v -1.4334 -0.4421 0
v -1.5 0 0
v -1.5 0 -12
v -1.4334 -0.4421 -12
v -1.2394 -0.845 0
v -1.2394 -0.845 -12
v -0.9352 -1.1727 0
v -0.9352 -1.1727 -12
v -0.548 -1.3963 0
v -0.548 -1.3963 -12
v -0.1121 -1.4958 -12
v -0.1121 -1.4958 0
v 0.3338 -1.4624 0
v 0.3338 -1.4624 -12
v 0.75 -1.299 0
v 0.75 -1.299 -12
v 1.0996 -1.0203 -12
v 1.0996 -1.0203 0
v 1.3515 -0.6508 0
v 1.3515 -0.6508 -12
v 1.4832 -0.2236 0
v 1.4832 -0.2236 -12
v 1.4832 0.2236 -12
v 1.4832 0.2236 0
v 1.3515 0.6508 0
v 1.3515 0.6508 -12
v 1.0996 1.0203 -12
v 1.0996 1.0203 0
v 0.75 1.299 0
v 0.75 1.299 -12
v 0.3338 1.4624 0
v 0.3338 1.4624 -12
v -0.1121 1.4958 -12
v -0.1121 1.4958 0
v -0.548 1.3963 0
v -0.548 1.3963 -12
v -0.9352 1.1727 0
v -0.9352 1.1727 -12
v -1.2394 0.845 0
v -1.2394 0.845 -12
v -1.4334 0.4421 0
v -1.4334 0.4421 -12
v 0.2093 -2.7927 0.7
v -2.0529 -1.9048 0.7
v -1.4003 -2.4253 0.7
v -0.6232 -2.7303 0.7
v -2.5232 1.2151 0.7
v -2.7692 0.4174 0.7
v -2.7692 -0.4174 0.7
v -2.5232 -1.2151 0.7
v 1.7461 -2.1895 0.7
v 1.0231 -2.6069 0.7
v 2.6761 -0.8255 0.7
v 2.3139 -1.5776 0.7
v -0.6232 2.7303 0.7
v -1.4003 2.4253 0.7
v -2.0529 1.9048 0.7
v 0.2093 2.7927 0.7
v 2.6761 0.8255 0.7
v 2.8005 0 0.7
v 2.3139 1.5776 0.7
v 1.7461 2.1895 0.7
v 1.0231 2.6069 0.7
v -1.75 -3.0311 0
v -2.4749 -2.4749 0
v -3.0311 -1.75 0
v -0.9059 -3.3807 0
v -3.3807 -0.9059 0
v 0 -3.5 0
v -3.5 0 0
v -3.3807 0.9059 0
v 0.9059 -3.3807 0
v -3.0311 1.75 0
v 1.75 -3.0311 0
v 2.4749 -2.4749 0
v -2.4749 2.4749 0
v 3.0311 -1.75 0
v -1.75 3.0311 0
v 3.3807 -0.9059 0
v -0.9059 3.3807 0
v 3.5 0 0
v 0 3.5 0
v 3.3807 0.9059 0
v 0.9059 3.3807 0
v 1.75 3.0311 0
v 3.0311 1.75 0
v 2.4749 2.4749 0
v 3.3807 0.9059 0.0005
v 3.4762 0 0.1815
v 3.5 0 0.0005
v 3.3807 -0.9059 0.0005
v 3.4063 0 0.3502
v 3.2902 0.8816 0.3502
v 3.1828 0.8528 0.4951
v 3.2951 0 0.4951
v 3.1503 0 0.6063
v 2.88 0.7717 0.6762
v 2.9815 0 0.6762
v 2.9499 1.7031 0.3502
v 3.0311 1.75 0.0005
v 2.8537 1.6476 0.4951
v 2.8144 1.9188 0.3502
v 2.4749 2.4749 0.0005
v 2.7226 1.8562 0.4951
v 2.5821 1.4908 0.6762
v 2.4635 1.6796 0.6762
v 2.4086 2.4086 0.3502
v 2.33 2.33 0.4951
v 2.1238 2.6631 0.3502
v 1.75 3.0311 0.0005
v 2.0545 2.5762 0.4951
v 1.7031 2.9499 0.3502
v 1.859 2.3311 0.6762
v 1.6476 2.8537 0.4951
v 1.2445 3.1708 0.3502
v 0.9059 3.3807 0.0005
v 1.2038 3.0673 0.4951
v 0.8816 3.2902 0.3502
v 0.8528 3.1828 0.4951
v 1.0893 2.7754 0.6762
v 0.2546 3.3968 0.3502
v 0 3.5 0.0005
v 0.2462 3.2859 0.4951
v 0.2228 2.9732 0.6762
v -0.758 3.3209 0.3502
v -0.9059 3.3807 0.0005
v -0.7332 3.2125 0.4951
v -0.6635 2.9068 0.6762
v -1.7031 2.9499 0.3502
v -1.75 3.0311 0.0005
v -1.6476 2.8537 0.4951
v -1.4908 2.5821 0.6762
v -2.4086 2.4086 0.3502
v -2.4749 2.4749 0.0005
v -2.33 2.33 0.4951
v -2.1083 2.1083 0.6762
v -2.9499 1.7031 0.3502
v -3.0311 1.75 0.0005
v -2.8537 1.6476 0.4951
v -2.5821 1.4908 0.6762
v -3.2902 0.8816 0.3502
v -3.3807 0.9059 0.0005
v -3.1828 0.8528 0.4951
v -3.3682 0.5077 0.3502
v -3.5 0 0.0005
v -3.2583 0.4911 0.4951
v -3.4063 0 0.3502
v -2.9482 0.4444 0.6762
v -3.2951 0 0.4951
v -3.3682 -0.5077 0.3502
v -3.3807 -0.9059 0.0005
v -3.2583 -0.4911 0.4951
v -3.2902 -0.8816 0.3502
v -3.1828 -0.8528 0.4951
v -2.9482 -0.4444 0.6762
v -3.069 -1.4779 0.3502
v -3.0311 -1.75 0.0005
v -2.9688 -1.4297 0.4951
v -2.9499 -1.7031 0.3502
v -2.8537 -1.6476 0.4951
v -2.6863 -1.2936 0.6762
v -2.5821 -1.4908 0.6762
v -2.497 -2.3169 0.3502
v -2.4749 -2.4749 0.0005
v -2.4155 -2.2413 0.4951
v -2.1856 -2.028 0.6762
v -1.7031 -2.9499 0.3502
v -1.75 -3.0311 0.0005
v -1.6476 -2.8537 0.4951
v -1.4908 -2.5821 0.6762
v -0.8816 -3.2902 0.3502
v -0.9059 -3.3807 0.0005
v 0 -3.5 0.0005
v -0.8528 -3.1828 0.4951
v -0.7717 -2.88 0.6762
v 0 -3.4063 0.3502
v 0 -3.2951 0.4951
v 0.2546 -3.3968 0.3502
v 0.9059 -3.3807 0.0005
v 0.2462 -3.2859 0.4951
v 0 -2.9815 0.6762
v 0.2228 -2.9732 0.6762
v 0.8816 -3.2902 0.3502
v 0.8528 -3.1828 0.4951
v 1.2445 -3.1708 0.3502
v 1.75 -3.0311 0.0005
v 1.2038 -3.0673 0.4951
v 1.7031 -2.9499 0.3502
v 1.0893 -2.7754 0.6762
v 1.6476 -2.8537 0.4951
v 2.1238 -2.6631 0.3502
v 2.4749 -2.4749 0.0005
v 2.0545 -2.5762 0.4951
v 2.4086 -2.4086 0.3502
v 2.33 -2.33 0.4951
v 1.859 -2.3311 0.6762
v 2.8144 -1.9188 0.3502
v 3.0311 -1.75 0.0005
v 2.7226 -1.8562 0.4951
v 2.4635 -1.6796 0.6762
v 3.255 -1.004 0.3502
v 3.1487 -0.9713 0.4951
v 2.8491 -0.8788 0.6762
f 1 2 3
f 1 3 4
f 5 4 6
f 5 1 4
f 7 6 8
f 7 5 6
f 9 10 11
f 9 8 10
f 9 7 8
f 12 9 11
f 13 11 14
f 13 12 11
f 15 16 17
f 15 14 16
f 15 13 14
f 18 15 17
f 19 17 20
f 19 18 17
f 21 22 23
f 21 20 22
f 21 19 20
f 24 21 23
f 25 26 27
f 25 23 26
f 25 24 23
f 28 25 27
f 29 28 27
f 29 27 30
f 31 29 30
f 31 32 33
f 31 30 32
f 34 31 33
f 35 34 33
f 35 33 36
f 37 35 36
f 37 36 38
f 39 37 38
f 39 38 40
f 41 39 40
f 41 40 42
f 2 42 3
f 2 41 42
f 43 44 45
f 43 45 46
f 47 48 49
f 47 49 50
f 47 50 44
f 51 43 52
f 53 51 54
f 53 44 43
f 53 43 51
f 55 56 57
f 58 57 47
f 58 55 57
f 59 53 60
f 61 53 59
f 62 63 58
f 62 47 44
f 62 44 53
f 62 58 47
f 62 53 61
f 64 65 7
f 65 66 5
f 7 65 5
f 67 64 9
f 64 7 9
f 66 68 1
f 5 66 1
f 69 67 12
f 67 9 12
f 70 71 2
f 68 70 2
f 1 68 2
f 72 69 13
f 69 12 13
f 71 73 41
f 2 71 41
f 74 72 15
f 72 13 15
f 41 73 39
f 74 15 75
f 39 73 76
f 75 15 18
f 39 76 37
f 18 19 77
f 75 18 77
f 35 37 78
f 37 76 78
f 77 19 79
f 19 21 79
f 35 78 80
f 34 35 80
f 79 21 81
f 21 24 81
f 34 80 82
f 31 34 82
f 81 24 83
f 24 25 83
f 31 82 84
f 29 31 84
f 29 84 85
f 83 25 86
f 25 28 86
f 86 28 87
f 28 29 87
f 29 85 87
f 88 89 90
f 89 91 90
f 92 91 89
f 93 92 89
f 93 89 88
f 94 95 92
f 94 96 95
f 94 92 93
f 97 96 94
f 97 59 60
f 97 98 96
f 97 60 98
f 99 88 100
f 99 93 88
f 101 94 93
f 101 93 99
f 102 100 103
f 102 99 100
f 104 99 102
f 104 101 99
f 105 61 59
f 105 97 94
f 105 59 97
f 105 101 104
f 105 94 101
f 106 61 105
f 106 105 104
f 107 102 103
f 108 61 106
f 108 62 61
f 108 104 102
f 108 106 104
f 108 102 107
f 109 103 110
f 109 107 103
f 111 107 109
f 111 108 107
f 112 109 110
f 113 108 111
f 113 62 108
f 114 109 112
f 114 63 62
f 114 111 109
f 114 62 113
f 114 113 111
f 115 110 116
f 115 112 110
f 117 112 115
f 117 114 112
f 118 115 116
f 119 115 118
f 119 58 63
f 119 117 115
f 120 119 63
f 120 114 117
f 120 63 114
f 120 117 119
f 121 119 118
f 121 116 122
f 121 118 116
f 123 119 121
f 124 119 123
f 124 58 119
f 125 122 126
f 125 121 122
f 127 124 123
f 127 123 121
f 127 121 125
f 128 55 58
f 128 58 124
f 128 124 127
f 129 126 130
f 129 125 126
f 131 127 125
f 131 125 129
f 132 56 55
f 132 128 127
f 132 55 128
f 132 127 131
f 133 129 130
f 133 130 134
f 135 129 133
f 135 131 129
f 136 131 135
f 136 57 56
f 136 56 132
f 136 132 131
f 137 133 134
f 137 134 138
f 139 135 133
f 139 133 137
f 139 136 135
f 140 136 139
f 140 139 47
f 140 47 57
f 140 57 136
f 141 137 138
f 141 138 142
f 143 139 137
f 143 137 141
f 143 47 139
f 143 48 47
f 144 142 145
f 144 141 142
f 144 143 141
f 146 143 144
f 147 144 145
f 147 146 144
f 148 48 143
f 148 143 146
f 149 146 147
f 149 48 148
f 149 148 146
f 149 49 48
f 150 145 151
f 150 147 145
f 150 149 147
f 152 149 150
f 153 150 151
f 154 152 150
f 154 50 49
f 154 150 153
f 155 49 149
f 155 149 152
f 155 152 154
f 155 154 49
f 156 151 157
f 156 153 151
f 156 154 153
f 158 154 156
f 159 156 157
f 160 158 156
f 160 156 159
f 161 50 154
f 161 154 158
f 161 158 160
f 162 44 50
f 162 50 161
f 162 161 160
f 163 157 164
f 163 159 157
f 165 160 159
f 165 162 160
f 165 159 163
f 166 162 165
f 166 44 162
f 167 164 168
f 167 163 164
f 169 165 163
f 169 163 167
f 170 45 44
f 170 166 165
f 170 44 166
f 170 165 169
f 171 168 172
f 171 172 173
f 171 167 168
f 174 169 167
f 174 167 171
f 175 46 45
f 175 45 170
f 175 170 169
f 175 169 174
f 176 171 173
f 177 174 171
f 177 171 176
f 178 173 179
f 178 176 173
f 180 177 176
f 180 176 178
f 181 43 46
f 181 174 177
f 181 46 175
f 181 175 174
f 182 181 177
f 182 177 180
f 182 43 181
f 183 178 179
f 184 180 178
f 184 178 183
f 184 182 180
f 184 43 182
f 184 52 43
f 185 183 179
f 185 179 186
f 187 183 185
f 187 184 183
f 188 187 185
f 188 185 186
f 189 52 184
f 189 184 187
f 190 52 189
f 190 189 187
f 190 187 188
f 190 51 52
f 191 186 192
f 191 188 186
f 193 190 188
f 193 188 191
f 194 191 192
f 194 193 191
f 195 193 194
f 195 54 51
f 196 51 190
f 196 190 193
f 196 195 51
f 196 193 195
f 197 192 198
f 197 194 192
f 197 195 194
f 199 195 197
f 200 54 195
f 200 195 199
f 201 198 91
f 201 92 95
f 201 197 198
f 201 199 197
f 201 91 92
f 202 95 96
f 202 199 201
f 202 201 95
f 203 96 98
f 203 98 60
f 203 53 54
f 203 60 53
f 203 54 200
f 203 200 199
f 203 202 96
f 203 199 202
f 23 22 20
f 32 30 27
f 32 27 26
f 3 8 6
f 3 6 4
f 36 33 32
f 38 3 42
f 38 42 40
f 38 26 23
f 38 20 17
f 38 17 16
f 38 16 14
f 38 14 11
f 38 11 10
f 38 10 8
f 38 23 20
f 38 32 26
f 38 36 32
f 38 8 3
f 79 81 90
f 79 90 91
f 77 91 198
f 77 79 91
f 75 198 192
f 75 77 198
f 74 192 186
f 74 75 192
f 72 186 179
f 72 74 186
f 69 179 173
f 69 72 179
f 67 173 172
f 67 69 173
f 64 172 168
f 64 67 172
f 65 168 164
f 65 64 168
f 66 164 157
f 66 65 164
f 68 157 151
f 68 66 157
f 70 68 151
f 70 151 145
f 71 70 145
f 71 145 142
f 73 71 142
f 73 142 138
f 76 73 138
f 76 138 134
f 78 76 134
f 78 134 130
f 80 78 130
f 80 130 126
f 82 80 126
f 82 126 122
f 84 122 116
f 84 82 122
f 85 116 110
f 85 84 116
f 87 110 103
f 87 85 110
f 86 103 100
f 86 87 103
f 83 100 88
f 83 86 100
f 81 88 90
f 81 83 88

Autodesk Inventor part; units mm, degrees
ref_plane "YZ Plane" through (0, 0, 0) normal (1, 0, 0) x (0, 1, 0)
ref_plane "XZ Plane" through (0, 0, 0) normal (0, 1, 0) x (-1, 0, 0)
ref_plane "XY Plane" through (0, 0, 0) normal (0, 0, 1) x (1, 0, 0)
sketch "スケッチ1" plane through (0, 0, 0) normal (0, 0, 1) x (1, 0, 0)
  circle A0 centre (0, 0) radius 3.5
  dimension "d0" = 7
extrude "押し出し1" add sketch "スケッチ1" along normal blind 0.7
sketch "スケッチ2" plane through (0, 0, 0) normal (0, 0, -1) x (-1, 0, 0)
  circle A0 centre (0, 0) radius 1.5
  dimension "d3" = 3
extrude "押し出し2" add sketch "スケッチ2" along normal blind 12
thread "ねじ1" size "M3x0.5" class "6g" standard "ANSI Metric M Profile" full length
fillet "フィレット1" radius 0.7 1 edges at (-3.5, 0, 0.7)
properties part number "ネジ低頭m3.12" material "鋼、高強度、低合金"
